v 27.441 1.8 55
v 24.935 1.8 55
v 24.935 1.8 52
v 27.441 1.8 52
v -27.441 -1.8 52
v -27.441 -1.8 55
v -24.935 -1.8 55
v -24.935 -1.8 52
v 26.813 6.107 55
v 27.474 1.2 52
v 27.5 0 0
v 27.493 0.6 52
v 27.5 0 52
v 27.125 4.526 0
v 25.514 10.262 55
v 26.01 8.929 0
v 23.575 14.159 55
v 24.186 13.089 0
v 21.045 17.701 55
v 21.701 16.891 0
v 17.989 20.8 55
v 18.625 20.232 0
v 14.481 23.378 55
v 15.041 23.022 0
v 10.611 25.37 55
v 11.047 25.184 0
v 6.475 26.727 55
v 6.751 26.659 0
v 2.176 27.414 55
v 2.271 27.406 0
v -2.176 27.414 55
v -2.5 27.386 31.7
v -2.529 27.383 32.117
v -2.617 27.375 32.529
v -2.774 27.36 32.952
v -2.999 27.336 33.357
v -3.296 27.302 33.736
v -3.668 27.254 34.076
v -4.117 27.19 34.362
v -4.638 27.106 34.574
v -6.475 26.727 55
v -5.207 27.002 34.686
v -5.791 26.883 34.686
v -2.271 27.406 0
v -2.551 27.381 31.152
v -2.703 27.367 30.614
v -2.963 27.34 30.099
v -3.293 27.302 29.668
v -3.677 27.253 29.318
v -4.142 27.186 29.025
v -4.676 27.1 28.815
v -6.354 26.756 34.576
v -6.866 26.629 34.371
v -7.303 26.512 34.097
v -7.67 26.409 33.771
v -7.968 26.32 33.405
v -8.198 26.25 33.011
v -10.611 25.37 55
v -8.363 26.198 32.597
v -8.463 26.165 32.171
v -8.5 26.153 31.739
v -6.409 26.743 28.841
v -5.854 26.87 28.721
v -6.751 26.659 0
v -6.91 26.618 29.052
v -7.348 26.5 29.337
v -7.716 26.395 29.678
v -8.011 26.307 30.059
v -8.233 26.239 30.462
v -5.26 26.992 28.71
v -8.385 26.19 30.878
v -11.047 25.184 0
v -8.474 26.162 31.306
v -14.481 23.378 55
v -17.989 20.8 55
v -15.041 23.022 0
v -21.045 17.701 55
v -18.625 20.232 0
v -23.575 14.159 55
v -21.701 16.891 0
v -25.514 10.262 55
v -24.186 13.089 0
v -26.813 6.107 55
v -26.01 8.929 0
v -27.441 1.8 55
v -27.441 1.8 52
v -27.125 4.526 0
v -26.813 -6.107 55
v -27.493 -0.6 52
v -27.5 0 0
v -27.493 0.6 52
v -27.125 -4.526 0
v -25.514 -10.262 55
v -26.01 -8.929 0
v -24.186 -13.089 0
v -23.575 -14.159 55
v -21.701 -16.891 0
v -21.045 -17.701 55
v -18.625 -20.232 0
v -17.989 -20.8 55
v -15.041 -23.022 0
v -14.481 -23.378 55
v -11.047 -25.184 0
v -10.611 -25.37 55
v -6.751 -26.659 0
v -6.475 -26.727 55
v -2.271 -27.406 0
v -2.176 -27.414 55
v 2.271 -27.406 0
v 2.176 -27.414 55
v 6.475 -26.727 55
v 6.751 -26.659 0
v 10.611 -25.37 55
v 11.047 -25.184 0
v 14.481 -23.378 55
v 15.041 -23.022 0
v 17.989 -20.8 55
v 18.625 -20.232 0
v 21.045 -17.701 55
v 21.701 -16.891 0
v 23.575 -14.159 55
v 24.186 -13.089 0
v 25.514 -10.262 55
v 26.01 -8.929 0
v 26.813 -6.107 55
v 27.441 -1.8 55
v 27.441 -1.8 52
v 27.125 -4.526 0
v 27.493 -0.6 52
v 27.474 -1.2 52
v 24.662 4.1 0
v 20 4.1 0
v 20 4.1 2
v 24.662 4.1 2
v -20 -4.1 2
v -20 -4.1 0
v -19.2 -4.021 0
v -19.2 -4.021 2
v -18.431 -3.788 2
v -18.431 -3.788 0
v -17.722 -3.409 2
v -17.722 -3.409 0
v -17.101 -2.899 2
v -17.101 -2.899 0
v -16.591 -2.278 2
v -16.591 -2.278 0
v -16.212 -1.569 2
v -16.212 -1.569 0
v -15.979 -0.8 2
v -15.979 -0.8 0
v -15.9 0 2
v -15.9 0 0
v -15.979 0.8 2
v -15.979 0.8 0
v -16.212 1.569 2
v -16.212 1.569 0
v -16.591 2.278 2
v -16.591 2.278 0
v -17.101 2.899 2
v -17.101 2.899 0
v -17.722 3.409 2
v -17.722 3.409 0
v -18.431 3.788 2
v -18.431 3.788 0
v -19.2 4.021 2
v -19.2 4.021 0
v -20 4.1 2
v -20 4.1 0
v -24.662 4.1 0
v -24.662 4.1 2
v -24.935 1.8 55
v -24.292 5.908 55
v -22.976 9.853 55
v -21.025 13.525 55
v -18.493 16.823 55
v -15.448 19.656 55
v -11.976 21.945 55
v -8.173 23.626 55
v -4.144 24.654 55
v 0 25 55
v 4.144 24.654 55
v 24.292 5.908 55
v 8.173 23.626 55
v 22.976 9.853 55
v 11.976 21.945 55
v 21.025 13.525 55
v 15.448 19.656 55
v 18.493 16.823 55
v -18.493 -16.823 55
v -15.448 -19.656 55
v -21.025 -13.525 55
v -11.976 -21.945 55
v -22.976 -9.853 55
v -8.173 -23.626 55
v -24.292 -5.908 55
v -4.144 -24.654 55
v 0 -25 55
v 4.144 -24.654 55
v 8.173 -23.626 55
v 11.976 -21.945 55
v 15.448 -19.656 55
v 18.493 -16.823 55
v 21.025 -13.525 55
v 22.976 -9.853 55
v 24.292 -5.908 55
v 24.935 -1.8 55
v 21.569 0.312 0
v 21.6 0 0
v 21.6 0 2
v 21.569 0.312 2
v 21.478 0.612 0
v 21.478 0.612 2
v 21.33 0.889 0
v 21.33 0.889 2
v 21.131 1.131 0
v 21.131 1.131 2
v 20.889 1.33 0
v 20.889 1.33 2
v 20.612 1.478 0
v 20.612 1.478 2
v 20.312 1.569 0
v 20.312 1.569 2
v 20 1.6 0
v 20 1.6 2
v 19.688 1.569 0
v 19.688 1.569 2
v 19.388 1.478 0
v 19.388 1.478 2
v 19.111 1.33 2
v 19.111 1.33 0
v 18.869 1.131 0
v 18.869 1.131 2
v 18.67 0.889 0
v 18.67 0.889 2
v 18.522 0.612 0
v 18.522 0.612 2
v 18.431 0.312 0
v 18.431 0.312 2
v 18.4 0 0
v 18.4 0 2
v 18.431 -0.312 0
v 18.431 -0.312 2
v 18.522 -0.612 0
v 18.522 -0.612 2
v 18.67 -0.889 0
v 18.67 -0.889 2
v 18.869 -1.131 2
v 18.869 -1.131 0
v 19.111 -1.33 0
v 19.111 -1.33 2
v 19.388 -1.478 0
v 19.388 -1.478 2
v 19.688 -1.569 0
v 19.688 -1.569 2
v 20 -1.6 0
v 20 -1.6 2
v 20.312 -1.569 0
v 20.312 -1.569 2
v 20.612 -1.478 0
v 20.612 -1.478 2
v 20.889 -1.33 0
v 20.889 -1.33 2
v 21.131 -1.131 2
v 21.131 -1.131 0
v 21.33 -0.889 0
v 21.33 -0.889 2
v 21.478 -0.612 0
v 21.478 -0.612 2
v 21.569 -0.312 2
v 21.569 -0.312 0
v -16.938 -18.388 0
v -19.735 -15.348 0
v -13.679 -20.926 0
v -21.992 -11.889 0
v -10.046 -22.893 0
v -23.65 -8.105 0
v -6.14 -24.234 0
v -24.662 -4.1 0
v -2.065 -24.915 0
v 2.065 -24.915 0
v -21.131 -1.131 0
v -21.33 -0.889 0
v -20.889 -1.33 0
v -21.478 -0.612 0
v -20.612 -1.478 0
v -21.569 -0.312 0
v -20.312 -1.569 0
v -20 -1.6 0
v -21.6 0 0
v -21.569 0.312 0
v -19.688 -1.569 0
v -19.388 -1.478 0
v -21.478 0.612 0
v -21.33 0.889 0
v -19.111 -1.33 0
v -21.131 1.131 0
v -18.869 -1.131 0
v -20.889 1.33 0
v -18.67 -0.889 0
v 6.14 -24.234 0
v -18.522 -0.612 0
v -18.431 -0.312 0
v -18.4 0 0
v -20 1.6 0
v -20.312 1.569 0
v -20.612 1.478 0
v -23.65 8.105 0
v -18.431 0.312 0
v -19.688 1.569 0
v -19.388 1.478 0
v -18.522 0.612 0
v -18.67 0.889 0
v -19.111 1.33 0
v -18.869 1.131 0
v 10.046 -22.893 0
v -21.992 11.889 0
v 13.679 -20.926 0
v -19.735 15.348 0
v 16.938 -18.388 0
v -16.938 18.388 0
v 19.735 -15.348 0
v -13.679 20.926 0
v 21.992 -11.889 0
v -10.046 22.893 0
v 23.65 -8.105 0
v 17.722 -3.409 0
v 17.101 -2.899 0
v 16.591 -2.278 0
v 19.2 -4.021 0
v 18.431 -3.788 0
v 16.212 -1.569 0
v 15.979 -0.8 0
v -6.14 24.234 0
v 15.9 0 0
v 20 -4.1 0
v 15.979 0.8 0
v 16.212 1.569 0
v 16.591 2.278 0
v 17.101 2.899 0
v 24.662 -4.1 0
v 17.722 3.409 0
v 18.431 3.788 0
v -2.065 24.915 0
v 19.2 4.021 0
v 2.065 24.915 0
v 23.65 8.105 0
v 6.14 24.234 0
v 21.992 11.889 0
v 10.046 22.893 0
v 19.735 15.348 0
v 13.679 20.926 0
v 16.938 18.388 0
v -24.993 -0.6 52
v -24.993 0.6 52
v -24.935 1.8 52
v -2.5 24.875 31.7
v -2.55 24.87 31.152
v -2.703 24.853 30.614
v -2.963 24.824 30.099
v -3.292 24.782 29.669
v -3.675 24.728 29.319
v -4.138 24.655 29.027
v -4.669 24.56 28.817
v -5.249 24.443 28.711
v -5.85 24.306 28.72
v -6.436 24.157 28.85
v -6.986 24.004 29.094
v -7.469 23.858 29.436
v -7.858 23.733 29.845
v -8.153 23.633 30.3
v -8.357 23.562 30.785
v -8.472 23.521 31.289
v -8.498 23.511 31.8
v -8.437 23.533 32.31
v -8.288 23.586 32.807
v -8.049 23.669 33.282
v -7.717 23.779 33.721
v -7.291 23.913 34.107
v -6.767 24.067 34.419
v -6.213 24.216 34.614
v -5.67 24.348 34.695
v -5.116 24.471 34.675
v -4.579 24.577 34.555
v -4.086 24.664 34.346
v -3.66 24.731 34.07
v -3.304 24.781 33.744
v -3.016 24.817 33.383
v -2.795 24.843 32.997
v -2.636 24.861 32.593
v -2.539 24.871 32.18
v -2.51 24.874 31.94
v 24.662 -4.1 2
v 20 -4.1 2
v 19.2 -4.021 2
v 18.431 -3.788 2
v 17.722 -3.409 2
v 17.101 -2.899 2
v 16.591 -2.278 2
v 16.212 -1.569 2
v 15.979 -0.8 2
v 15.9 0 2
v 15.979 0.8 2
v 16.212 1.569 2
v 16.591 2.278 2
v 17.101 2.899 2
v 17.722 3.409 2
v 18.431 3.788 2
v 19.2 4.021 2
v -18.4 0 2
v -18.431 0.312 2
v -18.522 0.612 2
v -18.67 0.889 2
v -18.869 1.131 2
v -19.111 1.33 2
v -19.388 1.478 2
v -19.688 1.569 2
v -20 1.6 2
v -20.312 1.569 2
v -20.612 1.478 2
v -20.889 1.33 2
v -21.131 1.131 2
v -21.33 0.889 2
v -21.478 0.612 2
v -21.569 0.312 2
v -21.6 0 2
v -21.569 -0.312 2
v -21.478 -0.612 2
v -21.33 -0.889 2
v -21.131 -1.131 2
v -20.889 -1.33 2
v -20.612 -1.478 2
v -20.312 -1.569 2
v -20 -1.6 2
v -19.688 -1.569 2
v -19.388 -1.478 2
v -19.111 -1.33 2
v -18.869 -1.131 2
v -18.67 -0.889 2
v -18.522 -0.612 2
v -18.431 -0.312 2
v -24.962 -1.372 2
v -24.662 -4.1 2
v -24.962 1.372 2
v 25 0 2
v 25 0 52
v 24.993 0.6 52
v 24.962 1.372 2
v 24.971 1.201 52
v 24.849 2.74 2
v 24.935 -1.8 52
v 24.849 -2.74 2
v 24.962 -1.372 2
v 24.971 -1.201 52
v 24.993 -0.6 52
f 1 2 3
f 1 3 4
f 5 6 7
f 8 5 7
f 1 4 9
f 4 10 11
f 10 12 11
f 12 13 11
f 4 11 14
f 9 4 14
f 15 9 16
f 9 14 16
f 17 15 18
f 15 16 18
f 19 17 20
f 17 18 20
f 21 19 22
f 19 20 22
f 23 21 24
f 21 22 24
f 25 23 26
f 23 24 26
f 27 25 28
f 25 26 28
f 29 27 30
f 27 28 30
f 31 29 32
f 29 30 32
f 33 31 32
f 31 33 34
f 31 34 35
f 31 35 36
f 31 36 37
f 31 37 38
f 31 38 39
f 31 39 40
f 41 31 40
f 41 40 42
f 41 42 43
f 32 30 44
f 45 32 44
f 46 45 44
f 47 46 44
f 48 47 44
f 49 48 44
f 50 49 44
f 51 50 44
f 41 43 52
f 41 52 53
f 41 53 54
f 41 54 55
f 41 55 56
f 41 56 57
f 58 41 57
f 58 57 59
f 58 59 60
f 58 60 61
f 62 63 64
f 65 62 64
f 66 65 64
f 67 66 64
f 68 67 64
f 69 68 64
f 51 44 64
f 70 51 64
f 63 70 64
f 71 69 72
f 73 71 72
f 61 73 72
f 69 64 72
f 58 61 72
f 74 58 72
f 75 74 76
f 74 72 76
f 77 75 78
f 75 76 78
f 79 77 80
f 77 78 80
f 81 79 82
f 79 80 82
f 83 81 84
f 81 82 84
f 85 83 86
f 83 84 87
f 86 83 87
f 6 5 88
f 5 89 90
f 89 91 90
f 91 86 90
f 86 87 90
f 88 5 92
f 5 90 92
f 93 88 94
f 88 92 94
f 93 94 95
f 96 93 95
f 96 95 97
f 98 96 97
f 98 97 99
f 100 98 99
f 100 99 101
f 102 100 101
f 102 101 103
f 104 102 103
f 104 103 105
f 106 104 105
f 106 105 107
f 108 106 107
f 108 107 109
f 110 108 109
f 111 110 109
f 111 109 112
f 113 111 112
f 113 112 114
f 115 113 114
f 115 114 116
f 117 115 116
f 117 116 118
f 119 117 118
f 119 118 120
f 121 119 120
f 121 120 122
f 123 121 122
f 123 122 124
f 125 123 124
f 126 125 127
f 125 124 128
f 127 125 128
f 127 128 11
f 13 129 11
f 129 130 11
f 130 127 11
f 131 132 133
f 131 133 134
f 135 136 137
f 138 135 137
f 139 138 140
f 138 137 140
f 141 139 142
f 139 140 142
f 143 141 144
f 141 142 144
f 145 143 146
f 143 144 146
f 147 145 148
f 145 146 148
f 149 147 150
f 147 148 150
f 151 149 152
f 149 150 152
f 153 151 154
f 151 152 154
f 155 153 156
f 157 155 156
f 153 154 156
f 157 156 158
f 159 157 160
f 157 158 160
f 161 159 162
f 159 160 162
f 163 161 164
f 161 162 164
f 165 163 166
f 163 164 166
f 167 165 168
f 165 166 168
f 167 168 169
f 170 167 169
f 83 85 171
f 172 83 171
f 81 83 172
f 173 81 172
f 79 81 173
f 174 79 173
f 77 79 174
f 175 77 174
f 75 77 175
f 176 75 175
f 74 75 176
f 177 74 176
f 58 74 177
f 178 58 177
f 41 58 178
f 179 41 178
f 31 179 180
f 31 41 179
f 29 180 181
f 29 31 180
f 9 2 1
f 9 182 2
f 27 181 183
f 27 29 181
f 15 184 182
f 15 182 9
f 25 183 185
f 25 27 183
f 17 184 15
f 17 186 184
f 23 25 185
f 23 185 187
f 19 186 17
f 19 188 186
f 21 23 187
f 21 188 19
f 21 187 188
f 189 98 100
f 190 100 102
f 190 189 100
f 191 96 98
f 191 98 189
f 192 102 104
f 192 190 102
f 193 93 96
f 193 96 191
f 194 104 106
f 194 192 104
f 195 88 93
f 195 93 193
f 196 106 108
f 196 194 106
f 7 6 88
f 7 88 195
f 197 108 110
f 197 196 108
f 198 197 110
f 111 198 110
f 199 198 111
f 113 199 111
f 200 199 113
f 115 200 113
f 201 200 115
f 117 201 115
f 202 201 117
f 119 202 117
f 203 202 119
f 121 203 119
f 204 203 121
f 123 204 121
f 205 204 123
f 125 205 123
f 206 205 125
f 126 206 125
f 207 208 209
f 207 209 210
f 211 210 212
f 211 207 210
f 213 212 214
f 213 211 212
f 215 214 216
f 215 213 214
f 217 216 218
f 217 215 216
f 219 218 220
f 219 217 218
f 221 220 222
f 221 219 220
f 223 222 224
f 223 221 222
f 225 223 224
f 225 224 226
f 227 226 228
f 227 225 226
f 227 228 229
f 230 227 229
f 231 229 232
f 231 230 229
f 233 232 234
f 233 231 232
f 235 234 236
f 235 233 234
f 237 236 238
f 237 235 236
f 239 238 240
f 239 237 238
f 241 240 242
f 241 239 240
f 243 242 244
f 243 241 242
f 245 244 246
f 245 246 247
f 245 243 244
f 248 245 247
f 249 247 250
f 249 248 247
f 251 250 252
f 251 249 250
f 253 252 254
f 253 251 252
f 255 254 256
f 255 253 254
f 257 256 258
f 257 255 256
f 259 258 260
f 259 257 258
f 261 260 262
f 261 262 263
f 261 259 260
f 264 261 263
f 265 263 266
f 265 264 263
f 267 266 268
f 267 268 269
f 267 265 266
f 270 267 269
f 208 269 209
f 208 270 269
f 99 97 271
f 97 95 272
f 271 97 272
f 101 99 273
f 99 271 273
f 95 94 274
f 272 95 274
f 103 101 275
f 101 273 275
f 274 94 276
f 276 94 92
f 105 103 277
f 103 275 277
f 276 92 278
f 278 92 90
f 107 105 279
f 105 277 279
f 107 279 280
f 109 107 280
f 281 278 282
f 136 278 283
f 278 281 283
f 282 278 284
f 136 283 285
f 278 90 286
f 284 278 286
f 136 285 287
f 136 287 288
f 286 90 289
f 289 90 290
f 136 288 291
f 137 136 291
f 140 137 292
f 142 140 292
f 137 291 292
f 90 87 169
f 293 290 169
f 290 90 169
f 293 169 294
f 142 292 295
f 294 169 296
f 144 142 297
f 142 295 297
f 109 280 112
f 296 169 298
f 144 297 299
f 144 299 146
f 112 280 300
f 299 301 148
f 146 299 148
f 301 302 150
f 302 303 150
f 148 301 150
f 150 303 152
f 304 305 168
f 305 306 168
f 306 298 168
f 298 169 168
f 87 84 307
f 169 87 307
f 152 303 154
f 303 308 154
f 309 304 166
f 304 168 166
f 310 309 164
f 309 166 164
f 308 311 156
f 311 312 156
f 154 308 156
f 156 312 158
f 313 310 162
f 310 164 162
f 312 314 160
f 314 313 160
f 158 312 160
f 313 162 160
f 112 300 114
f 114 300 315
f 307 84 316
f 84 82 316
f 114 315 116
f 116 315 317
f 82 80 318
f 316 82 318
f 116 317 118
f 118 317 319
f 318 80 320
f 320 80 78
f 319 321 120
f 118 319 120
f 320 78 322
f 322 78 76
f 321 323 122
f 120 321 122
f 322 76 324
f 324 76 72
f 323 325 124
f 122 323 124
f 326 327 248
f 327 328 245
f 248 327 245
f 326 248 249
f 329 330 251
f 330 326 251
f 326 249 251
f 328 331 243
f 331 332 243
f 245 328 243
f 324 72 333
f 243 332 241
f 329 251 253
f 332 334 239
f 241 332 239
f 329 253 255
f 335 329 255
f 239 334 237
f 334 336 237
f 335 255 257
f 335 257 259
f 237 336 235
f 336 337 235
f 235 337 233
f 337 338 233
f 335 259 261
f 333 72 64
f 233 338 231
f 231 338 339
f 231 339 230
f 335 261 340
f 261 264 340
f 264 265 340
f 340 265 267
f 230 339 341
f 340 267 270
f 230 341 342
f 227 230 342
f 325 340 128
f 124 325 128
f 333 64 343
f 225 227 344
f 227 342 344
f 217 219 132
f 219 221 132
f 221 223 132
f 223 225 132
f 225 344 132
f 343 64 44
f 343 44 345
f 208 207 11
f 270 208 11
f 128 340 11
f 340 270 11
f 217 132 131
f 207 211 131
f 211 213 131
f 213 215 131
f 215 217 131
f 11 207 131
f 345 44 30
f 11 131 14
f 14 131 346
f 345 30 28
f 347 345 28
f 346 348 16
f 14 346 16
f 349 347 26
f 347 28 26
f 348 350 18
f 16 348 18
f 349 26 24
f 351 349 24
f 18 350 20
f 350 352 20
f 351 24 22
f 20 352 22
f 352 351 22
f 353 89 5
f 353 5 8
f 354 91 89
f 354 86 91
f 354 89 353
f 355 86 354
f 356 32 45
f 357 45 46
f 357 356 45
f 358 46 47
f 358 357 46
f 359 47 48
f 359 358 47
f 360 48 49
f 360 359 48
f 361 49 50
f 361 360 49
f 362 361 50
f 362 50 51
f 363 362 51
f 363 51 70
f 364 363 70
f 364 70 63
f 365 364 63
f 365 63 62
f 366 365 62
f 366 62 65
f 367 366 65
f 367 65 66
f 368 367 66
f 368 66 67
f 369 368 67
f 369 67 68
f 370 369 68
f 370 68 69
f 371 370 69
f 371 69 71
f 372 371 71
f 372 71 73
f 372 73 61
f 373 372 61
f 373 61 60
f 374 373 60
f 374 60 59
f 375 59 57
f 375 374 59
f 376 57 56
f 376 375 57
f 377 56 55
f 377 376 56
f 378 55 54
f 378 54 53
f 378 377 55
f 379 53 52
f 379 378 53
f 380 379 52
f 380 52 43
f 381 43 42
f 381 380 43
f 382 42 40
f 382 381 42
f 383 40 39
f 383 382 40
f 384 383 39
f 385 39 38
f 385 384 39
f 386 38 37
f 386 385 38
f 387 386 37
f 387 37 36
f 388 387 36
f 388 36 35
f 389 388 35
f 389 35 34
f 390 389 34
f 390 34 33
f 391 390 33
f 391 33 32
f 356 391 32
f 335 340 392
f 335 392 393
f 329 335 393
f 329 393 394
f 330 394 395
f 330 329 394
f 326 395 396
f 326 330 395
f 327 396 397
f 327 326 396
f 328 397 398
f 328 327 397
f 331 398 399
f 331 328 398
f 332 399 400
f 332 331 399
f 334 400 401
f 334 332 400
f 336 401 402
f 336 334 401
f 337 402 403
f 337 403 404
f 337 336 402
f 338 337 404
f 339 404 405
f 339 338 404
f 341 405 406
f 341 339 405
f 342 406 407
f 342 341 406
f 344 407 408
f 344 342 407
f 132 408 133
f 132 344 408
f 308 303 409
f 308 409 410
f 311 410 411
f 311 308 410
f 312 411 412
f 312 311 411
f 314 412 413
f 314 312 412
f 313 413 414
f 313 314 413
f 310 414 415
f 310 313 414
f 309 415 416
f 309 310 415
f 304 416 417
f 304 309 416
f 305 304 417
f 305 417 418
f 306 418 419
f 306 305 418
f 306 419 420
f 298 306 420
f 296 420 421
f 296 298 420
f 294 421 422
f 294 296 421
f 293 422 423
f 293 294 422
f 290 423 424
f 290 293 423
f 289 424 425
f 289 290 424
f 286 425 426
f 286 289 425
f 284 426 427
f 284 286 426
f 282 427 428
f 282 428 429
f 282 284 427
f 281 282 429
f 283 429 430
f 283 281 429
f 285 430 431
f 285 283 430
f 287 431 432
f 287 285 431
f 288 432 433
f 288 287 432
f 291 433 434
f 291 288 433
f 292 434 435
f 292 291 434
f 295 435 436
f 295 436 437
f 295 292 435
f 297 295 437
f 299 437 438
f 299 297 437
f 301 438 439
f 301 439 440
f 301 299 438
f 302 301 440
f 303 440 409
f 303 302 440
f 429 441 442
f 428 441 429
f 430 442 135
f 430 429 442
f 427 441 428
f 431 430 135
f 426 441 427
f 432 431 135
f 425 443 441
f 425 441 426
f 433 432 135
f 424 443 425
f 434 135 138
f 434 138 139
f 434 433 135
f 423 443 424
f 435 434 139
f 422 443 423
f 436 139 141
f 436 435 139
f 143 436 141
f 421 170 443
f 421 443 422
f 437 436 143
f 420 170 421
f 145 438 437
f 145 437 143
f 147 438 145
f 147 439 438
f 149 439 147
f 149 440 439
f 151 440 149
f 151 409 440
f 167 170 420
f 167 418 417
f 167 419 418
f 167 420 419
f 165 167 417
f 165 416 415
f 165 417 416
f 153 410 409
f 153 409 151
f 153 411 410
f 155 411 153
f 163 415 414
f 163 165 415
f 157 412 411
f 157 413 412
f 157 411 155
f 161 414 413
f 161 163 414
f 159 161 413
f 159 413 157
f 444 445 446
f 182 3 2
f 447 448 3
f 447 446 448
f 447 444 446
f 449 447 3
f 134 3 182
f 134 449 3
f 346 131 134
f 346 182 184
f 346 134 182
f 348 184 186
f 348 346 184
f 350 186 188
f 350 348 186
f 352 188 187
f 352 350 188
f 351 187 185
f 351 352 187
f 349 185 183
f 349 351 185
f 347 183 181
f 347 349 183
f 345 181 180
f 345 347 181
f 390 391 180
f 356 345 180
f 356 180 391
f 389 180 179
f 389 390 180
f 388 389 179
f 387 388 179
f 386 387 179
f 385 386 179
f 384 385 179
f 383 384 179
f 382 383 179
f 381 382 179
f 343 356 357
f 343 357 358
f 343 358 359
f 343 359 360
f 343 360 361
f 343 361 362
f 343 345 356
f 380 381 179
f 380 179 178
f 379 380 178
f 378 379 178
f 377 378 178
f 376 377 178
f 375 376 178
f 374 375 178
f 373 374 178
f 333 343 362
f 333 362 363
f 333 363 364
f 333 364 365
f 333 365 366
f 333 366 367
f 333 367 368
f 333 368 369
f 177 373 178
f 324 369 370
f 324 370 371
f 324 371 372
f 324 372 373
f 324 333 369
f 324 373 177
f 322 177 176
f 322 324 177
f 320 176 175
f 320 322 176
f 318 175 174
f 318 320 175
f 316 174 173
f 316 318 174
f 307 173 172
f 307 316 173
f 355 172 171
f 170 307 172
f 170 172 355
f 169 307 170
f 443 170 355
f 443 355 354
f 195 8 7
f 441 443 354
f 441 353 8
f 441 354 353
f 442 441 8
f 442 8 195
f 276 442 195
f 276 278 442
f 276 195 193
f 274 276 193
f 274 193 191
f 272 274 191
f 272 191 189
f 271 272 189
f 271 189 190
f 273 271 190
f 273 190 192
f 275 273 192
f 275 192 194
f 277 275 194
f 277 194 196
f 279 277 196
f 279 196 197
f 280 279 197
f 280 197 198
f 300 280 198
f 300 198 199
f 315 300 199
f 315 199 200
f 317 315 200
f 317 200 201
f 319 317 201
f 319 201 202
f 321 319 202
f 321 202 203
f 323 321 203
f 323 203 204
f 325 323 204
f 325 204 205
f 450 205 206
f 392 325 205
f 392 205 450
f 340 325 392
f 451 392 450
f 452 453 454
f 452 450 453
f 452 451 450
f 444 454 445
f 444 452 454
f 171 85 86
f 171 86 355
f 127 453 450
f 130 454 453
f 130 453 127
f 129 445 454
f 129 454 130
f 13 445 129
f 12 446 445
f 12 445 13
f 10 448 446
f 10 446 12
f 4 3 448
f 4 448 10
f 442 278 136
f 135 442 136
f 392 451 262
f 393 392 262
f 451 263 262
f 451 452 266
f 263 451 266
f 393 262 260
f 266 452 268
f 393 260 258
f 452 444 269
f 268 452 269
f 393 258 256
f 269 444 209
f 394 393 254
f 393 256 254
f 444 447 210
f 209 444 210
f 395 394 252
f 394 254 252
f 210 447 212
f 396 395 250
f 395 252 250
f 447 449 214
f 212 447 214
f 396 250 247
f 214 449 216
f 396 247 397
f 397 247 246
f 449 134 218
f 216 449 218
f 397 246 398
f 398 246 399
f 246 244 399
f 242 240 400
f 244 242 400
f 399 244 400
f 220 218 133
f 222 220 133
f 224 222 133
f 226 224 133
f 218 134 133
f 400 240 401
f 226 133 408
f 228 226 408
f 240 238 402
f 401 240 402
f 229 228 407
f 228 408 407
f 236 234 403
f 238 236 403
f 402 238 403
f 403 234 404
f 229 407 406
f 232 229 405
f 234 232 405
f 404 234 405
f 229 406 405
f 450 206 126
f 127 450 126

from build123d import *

# Parameters (mm, degrees)
SKETCH1_R           = 27.5
SKETCH1_R_2         = 25
BOSS_EXTRUDE1_DEPTH = 55
SKETCH2_R           = 1.6
BOSS_EXTRUDE2_DEPTH = 2
CUT_EXTRUDE1_START  = 55
SKETCH3_W           = 60.535746445
SKETCH3_H           = 3.6
CUT_EXTRUDE1_DEPTH  = 3
SKETCH4_R           = 3
CUT_EXTRUDE2_DEPTH  = 28.5


with BuildPart() as part:
    # Sketch1 → Boss-Extrude1 (new body)
    with BuildSketch(Plane.XY):
        Circle(SKETCH1_R)
        Circle(SKETCH1_R_2, mode=Mode.SUBTRACT)
    extrude(amount=BOSS_EXTRUDE1_DEPTH)

    # Sketch2 → Boss-Extrude2 (add)
    with BuildSketch(Plane.XY):
        with BuildLine():
            Line((-20, 4.1), (-26.124079623, 4.1))
            Line((-26.124079623, 4.1), (-26.124079623, -4.1))
            Line((-26.124079623, -4.1), (-20, -4.1))
            ThreePointArc((-20, -4.1), (-15.9, 0), (-20, 4.1))
        make_face()
        with Locations((-20, 0)):
            Circle(SKETCH2_R, mode=Mode.SUBTRACT)
        with BuildLine():
            Line((26.124079623, -4.1), (20, -4.1))
            ThreePointArc((20, -4.1), (15.9, 0), (20, 4.1))
            Line((20, 4.1), (26.124079623, 4.1))
            Line((26.124079623, 4.1), (26.124079623, -4.1))
        make_face()
        with Locations((20, 0)):
            Circle(SKETCH2_R, mode=Mode.SUBTRACT)
    extrude(amount=BOSS_EXTRUDE2_DEPTH)

    # Sketch3 → Cut-Extrude1 (cut)
    with BuildSketch(Plane.XY.offset(CUT_EXTRUDE1_START)):
        with Locations((1.235423396, 0)):
            Rectangle(SKETCH3_W, SKETCH3_H)
    extrude(amount=-CUT_EXTRUDE1_DEPTH, mode=Mode.SUBTRACT)

    # Sketch4 → Cut-Extrude2 (cut, through all)
    with BuildSketch(Plane(origin=(0, 0, 0), x_dir=(1, 0, 0), z_dir=(0, 1, 0))):
        with Locations((-5.5, -31.7)):
            Circle(SKETCH4_R)
    extrude(amount=CUT_EXTRUDE2_DEPTH, mode=Mode.SUBTRACT)


solid = part.part
